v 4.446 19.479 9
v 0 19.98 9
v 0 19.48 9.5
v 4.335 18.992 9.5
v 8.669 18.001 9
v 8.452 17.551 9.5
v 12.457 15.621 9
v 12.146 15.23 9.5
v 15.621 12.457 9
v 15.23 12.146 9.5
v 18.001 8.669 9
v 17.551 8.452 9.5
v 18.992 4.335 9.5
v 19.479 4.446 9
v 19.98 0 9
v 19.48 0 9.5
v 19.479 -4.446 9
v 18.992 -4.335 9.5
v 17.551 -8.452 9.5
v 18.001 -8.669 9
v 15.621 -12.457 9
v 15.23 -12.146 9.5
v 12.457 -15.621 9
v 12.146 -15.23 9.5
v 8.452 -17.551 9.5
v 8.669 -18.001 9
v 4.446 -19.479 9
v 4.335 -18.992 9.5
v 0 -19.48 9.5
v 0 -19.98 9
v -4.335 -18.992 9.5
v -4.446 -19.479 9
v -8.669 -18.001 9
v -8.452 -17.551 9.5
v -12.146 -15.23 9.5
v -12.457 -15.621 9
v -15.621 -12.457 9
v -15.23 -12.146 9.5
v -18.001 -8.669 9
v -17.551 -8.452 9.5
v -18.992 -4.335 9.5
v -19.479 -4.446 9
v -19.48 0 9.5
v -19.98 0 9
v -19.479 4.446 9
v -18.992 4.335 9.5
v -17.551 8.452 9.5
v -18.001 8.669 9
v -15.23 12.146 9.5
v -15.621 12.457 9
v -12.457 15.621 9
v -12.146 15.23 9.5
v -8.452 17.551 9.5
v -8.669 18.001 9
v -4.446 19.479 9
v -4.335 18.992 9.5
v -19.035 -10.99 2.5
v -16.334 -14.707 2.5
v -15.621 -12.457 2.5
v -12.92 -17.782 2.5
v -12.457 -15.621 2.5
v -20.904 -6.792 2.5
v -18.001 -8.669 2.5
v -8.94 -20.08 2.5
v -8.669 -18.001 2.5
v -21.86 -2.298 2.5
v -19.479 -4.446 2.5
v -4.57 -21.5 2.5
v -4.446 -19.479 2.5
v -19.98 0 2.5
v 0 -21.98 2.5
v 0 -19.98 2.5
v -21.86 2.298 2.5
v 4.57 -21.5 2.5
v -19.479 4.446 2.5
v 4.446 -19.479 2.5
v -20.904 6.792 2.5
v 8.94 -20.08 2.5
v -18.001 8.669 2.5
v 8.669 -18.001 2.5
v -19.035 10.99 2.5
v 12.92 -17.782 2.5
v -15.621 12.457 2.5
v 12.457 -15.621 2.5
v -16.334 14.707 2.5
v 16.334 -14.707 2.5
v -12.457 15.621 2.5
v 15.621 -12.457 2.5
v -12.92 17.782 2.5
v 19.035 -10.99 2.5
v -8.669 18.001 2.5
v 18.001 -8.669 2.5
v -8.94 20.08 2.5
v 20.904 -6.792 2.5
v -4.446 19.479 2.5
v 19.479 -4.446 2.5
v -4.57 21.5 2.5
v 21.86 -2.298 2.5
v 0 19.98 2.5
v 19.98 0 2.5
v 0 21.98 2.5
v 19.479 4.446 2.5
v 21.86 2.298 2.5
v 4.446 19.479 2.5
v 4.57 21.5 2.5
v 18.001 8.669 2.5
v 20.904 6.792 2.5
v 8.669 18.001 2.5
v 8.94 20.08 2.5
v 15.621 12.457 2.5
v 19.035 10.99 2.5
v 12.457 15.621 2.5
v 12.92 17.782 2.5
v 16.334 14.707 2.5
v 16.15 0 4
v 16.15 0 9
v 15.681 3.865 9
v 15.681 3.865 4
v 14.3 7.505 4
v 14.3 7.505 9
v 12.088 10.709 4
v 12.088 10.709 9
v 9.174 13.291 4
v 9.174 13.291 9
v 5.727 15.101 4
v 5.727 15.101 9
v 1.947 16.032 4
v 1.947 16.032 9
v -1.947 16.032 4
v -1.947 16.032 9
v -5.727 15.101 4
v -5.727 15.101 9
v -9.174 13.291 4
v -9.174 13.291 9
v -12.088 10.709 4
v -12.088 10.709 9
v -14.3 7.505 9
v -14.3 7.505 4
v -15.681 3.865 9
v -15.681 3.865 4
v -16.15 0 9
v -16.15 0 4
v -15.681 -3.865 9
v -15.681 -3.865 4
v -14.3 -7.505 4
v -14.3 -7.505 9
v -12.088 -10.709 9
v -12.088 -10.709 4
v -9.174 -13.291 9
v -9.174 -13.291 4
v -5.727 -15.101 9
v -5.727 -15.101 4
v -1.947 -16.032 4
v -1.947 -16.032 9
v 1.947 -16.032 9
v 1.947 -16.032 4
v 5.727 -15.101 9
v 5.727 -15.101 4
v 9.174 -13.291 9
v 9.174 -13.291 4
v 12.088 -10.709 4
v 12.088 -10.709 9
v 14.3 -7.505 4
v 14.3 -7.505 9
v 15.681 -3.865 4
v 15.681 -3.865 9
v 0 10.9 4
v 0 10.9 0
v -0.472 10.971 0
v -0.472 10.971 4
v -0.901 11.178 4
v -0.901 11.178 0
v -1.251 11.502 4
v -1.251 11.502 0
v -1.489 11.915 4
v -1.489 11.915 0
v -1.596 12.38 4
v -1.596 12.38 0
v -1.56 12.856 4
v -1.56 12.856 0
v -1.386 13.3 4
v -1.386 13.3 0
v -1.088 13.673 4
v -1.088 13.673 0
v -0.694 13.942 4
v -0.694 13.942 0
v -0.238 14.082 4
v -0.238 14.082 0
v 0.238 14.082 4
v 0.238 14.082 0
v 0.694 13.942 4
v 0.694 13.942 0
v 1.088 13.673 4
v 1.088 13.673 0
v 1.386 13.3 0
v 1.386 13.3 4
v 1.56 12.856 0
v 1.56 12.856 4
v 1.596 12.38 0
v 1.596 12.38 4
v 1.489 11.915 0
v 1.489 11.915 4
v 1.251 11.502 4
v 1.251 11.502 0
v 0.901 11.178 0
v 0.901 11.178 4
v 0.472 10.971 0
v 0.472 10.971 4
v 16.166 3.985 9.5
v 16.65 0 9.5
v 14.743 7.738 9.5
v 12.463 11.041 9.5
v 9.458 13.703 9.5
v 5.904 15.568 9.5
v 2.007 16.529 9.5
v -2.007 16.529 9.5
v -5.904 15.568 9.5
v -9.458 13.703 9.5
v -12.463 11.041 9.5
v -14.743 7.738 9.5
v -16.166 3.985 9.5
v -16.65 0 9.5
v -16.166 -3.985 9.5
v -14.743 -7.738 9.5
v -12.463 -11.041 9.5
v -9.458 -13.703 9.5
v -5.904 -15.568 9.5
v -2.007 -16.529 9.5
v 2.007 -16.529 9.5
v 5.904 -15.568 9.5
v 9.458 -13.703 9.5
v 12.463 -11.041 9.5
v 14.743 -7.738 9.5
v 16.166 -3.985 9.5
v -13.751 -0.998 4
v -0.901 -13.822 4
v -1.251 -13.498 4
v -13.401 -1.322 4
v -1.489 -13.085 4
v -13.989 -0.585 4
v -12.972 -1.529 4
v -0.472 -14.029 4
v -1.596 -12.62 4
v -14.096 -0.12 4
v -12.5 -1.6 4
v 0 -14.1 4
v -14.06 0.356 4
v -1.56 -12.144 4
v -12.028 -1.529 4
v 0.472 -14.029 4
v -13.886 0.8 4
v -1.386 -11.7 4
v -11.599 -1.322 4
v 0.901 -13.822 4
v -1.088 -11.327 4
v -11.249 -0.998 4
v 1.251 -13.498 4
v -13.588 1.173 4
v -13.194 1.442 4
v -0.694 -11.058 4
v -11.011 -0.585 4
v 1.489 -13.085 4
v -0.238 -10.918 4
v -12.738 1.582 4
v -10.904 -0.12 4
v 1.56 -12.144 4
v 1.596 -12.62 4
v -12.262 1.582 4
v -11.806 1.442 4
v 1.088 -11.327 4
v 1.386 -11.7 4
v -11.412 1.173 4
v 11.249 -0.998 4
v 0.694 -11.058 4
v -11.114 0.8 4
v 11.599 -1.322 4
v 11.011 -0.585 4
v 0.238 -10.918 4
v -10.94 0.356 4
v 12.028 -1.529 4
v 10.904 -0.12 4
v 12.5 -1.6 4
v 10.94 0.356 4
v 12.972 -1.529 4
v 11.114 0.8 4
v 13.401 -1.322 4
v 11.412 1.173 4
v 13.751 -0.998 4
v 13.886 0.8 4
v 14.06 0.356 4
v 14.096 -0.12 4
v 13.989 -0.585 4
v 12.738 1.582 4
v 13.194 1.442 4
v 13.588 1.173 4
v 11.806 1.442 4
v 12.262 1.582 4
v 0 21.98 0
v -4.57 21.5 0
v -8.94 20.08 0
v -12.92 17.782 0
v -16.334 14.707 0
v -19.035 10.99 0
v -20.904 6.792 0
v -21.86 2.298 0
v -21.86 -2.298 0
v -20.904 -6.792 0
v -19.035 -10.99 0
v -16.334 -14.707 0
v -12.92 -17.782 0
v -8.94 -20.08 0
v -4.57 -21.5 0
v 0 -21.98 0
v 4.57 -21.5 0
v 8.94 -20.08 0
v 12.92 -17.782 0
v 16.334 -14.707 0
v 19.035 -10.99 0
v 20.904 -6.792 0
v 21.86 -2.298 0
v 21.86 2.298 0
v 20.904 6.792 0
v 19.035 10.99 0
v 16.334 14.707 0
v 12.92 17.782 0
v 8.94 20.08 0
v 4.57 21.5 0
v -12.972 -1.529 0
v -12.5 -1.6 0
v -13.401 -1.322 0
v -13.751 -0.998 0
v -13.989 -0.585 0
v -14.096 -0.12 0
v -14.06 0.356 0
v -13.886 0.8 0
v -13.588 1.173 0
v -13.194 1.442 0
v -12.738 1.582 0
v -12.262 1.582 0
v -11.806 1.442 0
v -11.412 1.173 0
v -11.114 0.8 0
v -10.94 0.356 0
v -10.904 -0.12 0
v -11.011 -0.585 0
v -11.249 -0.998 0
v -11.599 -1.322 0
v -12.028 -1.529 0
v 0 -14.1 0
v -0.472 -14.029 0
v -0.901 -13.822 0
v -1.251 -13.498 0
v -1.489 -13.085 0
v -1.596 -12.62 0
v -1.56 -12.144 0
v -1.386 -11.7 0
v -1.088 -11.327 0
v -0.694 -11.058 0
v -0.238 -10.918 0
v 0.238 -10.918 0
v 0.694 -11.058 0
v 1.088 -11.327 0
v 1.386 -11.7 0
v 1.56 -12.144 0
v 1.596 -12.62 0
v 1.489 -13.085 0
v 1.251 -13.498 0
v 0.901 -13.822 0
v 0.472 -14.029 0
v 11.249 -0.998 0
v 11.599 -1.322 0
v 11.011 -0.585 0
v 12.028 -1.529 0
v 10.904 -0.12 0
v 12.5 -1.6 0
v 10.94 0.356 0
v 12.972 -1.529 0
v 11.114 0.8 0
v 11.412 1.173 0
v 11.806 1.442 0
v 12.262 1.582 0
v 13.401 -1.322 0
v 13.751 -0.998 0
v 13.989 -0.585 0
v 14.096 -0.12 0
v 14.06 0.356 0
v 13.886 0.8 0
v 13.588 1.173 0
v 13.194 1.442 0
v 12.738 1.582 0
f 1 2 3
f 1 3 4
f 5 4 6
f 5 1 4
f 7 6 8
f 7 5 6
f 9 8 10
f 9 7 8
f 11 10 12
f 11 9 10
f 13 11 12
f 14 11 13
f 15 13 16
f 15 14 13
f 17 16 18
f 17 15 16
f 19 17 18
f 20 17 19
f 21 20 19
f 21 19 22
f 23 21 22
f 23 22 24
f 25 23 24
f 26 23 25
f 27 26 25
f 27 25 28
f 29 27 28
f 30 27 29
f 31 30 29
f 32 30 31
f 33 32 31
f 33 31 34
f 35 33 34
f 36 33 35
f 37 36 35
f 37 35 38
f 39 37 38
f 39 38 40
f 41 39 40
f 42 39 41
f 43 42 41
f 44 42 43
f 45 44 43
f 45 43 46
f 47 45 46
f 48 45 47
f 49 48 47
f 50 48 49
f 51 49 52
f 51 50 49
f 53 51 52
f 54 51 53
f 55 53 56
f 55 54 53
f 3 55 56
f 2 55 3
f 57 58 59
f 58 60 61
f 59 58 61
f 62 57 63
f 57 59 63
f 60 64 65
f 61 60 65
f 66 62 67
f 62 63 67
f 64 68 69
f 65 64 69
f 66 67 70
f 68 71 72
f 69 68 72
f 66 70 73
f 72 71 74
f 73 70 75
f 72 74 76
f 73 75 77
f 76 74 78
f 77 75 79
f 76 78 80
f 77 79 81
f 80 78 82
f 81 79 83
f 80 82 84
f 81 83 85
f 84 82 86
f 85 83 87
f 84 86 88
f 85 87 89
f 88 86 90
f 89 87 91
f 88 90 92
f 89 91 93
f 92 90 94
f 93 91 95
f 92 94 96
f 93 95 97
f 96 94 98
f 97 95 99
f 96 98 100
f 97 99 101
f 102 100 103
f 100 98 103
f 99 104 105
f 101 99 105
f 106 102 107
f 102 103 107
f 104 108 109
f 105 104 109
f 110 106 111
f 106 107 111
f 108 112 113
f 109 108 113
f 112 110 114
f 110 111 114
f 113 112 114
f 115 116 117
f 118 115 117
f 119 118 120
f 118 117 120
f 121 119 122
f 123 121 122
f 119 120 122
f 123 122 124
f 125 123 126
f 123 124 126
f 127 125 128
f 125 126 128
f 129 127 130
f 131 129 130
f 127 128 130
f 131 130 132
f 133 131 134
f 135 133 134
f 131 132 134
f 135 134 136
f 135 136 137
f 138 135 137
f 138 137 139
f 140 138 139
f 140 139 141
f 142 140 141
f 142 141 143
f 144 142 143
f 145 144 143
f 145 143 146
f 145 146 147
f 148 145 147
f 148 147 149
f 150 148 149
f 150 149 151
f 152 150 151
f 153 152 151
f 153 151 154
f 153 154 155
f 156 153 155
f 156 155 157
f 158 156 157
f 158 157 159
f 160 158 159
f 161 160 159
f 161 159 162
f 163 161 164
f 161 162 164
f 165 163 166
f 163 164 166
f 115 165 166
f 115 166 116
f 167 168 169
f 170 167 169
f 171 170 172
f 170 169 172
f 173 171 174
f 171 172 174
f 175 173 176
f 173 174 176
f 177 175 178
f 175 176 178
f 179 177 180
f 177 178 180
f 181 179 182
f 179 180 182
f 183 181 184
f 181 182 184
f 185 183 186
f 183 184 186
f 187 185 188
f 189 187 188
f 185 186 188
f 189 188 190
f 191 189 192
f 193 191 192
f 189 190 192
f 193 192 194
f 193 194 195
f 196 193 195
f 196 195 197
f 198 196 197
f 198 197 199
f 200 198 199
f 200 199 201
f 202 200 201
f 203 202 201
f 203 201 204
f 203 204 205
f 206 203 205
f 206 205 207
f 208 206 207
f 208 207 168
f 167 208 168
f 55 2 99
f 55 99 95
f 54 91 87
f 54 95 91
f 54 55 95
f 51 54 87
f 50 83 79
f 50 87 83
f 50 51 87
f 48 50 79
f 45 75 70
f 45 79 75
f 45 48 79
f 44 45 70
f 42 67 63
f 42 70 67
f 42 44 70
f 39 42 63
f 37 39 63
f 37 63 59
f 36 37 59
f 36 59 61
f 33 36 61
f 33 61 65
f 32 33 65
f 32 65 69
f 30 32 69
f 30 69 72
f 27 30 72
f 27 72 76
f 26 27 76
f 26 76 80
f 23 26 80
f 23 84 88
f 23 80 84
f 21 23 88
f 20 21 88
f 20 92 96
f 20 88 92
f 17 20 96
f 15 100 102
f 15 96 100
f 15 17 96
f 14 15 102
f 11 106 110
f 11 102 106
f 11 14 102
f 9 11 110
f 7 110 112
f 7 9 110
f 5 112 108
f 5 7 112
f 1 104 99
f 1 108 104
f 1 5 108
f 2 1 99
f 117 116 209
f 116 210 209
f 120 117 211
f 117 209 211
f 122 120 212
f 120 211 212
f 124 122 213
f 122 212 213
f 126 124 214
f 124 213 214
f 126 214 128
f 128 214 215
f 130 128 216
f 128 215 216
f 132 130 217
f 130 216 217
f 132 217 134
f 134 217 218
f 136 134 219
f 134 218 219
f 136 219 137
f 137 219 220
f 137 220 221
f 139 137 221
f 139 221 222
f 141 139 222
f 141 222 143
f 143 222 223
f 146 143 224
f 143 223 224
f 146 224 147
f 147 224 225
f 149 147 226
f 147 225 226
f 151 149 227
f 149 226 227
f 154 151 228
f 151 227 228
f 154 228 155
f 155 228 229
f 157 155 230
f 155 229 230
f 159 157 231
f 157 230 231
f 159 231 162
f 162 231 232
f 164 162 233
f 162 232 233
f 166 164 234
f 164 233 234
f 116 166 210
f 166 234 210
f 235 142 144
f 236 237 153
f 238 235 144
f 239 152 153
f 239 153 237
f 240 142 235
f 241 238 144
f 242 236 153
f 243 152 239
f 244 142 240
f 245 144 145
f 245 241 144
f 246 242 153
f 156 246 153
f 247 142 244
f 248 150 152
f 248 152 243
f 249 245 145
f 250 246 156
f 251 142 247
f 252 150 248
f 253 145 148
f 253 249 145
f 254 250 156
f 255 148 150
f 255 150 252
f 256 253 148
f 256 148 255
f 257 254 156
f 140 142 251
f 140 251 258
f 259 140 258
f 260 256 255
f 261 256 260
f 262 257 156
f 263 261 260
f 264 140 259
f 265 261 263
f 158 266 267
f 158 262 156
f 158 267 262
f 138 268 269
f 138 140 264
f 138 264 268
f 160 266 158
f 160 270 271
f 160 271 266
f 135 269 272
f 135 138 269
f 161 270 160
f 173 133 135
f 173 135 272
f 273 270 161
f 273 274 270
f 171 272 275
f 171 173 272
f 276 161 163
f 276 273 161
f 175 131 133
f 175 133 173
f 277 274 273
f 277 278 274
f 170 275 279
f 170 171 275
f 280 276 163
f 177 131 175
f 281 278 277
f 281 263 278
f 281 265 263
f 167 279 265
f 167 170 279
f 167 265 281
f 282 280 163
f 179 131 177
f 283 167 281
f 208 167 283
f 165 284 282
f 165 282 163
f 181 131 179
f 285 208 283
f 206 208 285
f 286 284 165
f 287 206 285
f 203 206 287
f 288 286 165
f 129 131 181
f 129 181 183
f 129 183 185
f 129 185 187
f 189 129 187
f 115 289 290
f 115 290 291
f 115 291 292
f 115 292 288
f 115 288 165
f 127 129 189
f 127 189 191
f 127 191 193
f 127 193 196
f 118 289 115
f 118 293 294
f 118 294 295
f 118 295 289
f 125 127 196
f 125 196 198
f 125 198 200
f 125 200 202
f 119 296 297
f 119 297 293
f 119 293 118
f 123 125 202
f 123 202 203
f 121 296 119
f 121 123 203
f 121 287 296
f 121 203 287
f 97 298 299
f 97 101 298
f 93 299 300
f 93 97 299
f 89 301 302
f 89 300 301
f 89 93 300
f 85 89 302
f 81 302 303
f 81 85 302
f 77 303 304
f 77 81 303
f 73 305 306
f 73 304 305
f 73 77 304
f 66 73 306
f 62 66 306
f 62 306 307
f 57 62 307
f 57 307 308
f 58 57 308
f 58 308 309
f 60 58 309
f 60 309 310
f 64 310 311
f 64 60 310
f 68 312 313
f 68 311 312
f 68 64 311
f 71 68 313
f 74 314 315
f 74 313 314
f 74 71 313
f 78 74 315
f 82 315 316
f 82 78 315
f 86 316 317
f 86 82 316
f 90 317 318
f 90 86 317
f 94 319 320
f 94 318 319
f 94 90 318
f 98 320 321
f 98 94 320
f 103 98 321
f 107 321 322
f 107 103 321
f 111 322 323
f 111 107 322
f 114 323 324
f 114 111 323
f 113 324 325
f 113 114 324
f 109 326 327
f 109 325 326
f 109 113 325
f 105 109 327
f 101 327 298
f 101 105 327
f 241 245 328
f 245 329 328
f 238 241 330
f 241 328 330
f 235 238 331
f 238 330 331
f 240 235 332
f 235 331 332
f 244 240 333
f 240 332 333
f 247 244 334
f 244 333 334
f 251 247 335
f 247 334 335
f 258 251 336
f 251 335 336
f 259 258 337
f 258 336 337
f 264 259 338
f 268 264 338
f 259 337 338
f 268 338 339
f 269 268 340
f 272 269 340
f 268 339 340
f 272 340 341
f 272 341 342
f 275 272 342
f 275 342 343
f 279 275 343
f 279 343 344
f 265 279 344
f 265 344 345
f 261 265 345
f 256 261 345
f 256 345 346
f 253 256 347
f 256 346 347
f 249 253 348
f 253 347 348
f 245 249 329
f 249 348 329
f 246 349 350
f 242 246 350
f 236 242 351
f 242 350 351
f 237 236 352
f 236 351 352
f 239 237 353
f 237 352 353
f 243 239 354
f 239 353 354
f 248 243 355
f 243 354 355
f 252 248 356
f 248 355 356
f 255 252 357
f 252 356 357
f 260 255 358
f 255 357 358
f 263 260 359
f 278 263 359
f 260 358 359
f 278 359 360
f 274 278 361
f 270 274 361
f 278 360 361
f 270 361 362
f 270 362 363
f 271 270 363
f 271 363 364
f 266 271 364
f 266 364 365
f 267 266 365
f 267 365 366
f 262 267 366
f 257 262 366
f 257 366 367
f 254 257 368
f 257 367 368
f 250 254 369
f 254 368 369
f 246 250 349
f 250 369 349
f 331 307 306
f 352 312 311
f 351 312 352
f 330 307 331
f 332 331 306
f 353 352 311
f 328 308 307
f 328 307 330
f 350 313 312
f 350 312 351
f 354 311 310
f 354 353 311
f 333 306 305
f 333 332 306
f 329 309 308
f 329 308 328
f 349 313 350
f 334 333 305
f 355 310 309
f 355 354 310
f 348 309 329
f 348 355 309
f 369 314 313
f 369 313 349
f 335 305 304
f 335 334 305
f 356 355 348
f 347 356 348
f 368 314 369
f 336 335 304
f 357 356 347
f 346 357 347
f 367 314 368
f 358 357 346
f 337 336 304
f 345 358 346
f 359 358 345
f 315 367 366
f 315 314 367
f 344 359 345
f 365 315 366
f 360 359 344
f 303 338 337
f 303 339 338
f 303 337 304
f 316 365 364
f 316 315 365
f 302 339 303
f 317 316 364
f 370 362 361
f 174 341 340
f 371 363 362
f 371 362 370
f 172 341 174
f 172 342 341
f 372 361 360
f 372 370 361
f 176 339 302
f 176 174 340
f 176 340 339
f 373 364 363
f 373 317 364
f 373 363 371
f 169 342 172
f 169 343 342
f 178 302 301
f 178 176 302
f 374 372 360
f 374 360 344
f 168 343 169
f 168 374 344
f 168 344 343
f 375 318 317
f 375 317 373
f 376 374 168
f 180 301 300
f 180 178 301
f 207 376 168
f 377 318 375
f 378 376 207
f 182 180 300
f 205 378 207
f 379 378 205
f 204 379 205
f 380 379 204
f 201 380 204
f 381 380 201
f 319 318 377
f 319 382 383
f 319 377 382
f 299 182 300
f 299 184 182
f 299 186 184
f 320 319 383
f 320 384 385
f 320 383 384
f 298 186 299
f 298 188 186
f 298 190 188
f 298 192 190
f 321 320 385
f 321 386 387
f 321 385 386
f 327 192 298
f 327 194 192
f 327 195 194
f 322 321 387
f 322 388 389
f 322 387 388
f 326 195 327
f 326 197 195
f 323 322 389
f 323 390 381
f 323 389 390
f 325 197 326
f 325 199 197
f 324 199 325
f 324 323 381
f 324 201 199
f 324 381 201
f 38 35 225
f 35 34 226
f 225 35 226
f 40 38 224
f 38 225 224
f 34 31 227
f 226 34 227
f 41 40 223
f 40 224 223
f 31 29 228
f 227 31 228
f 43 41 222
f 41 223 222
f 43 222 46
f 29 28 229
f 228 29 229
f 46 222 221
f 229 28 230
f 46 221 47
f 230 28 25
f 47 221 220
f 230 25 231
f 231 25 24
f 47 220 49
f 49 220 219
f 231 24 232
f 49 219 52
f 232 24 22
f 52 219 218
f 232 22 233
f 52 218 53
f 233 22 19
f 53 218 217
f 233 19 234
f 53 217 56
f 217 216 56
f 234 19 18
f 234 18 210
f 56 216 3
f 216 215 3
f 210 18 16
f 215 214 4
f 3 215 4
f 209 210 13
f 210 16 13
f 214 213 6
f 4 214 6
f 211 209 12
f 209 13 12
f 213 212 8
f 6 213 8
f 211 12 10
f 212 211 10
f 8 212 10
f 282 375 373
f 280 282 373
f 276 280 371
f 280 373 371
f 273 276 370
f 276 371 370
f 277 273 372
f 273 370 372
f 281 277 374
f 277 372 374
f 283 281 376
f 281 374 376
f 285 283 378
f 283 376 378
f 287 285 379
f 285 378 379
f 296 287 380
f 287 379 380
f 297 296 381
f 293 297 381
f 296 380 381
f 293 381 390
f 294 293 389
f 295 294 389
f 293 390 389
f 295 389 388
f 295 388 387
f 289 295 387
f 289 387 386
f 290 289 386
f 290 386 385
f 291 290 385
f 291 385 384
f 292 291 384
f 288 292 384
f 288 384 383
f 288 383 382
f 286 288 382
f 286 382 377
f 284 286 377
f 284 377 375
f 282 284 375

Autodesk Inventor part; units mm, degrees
ref_plane "YZ Plane" through (0, 0, 0) normal (1, 0, 0) x (0, 1, 0)
ref_plane "XZ Plane" through (0, 0, 0) normal (0, 1, 0) x (-1, 0, 0)
ref_plane "XY Plane" through (0, 0, 0) normal (0, 0, 1) x (1, 0, 0)
sketch "スケッチ1" plane through (0, 0, 0) normal (1, 0, 0) x (0, 1, 0)
  line L0 (21.98, 0) -> (21.98, 2.5)
  line L1 (21.98, 2.5) -> (19.98, 2.5)
  line L2 (19.98, 2.5) -> (19.98, 9.5)
  line L3 (19.98, 9.5) -> (0, 9.5)
  line L4 (0, 9.5) -> (0, 0)
  line L5 (0, 0) -> (21.98, 0)
  dimension "d0" = 19.98
  dimension "d1" = 7
  dimension "d2" = 2.5
  dimension "d3" = 2
revolve "回転1" add sketch "スケッチ1" angle 360 about axis through (0, 0, 9.5) along (0, 0, -1)
chamfer "面取り1" distance 0.5 angle 45 1 edges at (0, -19.98, 9.5)
sketch "スケッチ4" plane through (0, 0, 9.5) normal (0, 0, 1) x (1, 0, 0)
  circle A0 centre (0, 0) radius 12.5
  point P0 (0, 0)
  point P1 (0, 12.5)
  point P2 (-12.5, 0)
  point P3 (0, -12.5)
  point P4 (12.5, 0)
  dimension "d13" = 25
  dimension "d16" = 360
hole "穴1" at (0, 12.5, 9.5) at (-12.5, 0, 9.5) at (0, -12.5, 9.5) at (12.5, 0, 9.5) direction (0, 0, -1) diameter 3.2 end through all clearance for "Flat Head Machine Screw" size "M3" standard "Ansi Metric M Profile"
sketch "スケッチ5" plane through (0, 0, 9.5) normal (0, 0, 1) x (1, 0, 0)
  circle A0 centre (0, 0) radius 16.15
  point P0 (0, 0)
  dimension "d30" = 32.3
extrude "押し出し4" cut sketch "スケッチ5" against normal blind 5.5
chamfer "面取り2" distance 0.5 angle 45 1 edges at (-16.15, 0, 9.5)
properties part number "base13" material "ABS プラスチック"
